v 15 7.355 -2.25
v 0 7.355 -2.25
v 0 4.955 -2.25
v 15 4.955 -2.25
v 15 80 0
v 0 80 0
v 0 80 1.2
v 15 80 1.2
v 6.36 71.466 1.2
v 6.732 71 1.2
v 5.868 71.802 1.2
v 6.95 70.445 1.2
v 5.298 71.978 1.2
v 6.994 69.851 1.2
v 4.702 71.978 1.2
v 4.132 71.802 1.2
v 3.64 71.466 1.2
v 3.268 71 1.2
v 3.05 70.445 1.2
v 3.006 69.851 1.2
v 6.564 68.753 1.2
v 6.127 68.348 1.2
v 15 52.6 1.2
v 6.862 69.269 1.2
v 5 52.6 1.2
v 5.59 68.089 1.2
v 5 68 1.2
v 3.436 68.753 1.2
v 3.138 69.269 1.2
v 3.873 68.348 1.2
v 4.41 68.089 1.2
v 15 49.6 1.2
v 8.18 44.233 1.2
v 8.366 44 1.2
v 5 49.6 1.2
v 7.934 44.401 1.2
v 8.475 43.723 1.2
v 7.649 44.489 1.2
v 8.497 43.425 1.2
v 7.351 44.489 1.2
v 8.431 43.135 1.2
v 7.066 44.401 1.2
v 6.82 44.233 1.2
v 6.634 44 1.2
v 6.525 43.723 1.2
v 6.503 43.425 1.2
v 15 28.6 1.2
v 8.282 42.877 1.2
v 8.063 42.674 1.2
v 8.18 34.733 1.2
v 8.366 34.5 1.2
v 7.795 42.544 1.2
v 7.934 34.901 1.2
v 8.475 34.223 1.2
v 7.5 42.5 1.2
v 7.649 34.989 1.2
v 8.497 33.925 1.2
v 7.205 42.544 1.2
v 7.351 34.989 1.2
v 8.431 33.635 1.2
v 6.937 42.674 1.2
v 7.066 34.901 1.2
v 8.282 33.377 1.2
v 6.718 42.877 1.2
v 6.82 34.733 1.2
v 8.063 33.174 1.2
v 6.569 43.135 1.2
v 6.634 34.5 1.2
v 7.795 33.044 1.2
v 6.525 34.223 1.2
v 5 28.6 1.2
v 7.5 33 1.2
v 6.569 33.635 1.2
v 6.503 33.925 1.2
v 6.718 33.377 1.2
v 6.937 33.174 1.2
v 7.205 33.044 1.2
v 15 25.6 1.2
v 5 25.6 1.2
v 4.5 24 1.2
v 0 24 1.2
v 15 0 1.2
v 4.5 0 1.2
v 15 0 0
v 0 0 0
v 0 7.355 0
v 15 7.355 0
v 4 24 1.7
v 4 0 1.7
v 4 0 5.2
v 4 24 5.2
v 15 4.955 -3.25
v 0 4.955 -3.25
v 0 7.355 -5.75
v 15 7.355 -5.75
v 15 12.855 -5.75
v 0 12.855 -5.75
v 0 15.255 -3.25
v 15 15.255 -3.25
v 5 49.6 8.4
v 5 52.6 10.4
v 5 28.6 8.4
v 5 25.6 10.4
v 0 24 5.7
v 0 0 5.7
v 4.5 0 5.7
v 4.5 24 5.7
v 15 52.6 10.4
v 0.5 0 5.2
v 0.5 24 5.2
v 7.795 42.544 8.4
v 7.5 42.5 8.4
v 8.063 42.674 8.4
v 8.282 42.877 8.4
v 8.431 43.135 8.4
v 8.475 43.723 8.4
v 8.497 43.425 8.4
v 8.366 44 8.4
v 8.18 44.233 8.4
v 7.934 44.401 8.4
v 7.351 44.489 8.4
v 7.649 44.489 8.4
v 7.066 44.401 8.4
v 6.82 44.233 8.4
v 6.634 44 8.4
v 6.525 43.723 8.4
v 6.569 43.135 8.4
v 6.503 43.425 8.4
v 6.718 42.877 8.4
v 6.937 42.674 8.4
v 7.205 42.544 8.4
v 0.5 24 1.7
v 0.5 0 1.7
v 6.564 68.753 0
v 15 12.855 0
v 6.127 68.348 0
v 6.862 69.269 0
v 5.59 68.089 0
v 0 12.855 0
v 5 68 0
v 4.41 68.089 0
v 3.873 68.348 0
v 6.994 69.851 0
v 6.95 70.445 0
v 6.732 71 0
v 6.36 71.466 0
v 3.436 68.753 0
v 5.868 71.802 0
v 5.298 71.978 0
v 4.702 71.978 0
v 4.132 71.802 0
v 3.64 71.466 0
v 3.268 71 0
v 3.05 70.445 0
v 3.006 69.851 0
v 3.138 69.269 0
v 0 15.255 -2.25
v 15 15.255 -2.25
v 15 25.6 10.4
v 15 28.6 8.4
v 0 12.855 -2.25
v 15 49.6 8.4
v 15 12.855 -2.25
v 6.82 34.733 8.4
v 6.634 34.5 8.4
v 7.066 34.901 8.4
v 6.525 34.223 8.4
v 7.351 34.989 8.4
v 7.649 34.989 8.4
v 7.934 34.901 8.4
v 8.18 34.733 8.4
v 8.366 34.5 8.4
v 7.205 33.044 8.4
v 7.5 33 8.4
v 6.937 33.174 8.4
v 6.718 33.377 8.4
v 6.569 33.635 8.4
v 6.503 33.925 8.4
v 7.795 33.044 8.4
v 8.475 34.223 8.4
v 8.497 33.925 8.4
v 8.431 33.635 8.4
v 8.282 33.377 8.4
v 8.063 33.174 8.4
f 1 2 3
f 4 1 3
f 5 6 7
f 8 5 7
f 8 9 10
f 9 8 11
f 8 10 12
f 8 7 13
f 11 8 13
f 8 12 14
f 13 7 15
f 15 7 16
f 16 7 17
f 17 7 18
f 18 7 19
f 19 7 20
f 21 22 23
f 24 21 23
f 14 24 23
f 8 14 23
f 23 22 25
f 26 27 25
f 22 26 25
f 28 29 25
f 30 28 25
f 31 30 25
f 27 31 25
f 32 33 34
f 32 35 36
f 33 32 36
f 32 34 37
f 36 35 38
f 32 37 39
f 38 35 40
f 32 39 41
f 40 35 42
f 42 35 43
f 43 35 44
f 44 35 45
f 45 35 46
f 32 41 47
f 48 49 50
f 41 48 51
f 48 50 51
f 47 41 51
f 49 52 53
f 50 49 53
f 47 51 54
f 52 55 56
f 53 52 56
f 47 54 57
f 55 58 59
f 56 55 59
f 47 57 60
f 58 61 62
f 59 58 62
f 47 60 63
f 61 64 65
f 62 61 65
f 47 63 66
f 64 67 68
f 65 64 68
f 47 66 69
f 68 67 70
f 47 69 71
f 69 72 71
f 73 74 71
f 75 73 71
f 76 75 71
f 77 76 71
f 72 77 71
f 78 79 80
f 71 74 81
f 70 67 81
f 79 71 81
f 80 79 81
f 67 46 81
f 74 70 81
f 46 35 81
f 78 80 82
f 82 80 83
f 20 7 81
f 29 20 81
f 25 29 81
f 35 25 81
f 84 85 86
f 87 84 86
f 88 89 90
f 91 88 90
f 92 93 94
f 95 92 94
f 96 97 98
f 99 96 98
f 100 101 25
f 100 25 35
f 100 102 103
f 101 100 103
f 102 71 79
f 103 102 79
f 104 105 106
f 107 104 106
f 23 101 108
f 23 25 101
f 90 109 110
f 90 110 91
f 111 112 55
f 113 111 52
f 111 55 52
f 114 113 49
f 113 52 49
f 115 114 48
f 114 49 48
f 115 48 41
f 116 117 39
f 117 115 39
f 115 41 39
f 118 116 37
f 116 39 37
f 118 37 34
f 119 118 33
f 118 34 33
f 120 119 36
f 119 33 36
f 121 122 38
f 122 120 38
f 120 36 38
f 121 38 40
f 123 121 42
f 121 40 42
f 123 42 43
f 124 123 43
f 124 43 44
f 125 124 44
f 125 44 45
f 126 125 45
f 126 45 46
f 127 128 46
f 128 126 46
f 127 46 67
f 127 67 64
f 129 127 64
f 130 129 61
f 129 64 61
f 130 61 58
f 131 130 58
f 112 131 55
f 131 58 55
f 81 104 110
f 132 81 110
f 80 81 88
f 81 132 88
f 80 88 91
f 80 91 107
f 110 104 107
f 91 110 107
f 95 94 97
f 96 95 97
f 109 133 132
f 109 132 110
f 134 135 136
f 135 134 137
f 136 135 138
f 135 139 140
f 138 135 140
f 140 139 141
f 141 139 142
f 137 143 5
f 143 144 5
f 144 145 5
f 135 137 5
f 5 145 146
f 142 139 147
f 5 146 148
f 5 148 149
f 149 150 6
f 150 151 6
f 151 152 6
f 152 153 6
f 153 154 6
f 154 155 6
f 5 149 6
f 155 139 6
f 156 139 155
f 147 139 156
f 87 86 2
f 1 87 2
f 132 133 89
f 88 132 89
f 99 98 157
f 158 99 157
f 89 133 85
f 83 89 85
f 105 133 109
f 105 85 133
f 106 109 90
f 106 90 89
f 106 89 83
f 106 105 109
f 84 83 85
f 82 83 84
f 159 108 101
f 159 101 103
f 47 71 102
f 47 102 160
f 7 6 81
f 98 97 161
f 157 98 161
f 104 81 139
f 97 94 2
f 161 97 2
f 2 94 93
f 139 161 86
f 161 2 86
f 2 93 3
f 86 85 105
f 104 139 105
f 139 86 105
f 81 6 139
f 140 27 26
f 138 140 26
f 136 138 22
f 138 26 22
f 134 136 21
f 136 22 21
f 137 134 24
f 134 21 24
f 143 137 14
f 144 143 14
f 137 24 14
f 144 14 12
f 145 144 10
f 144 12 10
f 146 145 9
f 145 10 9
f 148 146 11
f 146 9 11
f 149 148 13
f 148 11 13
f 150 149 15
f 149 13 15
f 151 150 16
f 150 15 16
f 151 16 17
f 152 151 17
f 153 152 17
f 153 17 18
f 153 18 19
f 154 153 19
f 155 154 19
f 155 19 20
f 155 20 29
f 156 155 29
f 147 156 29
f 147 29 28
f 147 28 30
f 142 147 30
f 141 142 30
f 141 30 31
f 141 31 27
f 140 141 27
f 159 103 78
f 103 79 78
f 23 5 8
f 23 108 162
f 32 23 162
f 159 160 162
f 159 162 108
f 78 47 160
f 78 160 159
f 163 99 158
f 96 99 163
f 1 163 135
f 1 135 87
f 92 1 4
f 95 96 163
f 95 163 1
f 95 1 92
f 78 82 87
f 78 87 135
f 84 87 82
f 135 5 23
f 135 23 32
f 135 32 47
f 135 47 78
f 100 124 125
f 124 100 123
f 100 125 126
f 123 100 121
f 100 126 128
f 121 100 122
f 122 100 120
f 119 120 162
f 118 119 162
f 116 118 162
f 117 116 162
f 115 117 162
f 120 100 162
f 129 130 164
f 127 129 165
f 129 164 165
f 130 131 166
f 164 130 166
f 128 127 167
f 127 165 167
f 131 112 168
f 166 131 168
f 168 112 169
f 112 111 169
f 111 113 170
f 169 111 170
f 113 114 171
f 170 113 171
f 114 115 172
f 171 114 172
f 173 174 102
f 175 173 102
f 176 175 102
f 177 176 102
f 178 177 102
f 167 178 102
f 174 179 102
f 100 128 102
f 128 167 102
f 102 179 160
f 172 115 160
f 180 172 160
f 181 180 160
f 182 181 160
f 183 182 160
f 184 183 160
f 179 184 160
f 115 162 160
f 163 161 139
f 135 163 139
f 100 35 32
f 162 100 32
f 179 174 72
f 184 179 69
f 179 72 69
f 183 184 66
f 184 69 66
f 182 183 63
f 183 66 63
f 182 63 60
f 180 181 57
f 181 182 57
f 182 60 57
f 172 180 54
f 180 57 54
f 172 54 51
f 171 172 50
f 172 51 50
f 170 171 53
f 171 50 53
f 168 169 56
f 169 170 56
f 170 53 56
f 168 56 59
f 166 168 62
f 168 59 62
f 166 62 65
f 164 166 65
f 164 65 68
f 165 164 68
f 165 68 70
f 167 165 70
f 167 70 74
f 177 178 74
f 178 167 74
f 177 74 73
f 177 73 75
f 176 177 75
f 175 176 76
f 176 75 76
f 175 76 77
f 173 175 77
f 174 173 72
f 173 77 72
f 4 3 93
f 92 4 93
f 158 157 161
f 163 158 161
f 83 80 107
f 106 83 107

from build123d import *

# Parameters (mm, degrees)
PAD_DEPTH     = 15
SKETCH001_R   = 2
POCKET_DEPTH  = 6.951
SKETCH003_R   = 1
PAD001_DEPTH  = 9
SKETCH004_W   = 4.5
SKETCH004_H   = 4.5
SKETCH004_W_2 = 3.5
SKETCH004_H_2 = 3.5
PAD002_DEPTH  = 24
SKETCH008_W   = 3
SKETCH008_H   = 10
PAD005_DEPTH  = 7.2
SKETCH009_W   = 27
SKETCH009_H   = 10
PAD006_DEPTH  = 2


with BuildPart() as part:
    # Sketch → Pad (new body)
    with BuildSketch(Plane.YZ):
        Polygon((0, 0), (7.355, 0), (7.355, -2.25), (4.955, -2.25), (4.955, -3.25), (7.355, -5.75), (12.855, -5.75), (15.255, -3.25), (15.255, -2.25), (12.855, -2.25), (12.855, 0), (80, 0), (80, 1.2), (0, 1.2), align=None)
    extrude(amount=PAD_DEPTH)

    # Sketch001 (on Face13 of Pad) → Pocket (cut, through all)
    with BuildSketch(Plane(origin=(0, 0, 1.2), x_dir=(0, -1, 0), z_dir=(0, 0, 1))):
        with Locations((-70, 5)):
            Circle(SKETCH001_R)
    extrude(amount=-POCKET_DEPTH, mode=Mode.SUBTRACT)

    # Sketch003 (on Face6 of Pocket) → Pad001 (join)
    with BuildSketch(Plane(origin=(0, 0, 1.2), x_dir=(0, -1, 0), z_dir=(0, 0, 1))):
        with Locations((-43.5, 7.5)):
            Circle(SKETCH003_R)
        with Locations((-34, 7.5)):
            Circle(SKETCH003_R)
    extrude(amount=PAD001_DEPTH)

    # Sketch004 → Pad002 (join)
    with BuildSketch(Plane.XZ):
        with Locations((2.25, 3.45)):
            Rectangle(SKETCH004_W, SKETCH004_H)
        with Locations((2.25, 3.45)):
            Rectangle(SKETCH004_W_2, SKETCH004_H_2, mode=Mode.SUBTRACT)
    extrude(amount=-PAD002_DEPTH)

    # Sketch008 (on Face6 of Pad002) → Pad005 (join)
    with BuildSketch(Plane(origin=(0, 0, 1.2), x_dir=(0, -1, 0), z_dir=(0, 0, 1))):
        with Locations((-51.1, 10)):
            Rectangle(SKETCH008_W, SKETCH008_H)
        with Locations((-27.1, 10)):
            Rectangle(SKETCH008_W, SKETCH008_H)
    extrude(amount=PAD005_DEPTH)

    # Sketch009 (on Face32 of Pad005) → Pad006 (join)
    with BuildSketch(Plane(origin=(0, 0, 8.4), x_dir=(0, -1, 0), z_dir=(0, 0, 1))):
        with Locations((-39.1, 10)):
            Rectangle(SKETCH009_W, SKETCH009_H)
    extrude(amount=PAD006_DEPTH)


solid = part.part
